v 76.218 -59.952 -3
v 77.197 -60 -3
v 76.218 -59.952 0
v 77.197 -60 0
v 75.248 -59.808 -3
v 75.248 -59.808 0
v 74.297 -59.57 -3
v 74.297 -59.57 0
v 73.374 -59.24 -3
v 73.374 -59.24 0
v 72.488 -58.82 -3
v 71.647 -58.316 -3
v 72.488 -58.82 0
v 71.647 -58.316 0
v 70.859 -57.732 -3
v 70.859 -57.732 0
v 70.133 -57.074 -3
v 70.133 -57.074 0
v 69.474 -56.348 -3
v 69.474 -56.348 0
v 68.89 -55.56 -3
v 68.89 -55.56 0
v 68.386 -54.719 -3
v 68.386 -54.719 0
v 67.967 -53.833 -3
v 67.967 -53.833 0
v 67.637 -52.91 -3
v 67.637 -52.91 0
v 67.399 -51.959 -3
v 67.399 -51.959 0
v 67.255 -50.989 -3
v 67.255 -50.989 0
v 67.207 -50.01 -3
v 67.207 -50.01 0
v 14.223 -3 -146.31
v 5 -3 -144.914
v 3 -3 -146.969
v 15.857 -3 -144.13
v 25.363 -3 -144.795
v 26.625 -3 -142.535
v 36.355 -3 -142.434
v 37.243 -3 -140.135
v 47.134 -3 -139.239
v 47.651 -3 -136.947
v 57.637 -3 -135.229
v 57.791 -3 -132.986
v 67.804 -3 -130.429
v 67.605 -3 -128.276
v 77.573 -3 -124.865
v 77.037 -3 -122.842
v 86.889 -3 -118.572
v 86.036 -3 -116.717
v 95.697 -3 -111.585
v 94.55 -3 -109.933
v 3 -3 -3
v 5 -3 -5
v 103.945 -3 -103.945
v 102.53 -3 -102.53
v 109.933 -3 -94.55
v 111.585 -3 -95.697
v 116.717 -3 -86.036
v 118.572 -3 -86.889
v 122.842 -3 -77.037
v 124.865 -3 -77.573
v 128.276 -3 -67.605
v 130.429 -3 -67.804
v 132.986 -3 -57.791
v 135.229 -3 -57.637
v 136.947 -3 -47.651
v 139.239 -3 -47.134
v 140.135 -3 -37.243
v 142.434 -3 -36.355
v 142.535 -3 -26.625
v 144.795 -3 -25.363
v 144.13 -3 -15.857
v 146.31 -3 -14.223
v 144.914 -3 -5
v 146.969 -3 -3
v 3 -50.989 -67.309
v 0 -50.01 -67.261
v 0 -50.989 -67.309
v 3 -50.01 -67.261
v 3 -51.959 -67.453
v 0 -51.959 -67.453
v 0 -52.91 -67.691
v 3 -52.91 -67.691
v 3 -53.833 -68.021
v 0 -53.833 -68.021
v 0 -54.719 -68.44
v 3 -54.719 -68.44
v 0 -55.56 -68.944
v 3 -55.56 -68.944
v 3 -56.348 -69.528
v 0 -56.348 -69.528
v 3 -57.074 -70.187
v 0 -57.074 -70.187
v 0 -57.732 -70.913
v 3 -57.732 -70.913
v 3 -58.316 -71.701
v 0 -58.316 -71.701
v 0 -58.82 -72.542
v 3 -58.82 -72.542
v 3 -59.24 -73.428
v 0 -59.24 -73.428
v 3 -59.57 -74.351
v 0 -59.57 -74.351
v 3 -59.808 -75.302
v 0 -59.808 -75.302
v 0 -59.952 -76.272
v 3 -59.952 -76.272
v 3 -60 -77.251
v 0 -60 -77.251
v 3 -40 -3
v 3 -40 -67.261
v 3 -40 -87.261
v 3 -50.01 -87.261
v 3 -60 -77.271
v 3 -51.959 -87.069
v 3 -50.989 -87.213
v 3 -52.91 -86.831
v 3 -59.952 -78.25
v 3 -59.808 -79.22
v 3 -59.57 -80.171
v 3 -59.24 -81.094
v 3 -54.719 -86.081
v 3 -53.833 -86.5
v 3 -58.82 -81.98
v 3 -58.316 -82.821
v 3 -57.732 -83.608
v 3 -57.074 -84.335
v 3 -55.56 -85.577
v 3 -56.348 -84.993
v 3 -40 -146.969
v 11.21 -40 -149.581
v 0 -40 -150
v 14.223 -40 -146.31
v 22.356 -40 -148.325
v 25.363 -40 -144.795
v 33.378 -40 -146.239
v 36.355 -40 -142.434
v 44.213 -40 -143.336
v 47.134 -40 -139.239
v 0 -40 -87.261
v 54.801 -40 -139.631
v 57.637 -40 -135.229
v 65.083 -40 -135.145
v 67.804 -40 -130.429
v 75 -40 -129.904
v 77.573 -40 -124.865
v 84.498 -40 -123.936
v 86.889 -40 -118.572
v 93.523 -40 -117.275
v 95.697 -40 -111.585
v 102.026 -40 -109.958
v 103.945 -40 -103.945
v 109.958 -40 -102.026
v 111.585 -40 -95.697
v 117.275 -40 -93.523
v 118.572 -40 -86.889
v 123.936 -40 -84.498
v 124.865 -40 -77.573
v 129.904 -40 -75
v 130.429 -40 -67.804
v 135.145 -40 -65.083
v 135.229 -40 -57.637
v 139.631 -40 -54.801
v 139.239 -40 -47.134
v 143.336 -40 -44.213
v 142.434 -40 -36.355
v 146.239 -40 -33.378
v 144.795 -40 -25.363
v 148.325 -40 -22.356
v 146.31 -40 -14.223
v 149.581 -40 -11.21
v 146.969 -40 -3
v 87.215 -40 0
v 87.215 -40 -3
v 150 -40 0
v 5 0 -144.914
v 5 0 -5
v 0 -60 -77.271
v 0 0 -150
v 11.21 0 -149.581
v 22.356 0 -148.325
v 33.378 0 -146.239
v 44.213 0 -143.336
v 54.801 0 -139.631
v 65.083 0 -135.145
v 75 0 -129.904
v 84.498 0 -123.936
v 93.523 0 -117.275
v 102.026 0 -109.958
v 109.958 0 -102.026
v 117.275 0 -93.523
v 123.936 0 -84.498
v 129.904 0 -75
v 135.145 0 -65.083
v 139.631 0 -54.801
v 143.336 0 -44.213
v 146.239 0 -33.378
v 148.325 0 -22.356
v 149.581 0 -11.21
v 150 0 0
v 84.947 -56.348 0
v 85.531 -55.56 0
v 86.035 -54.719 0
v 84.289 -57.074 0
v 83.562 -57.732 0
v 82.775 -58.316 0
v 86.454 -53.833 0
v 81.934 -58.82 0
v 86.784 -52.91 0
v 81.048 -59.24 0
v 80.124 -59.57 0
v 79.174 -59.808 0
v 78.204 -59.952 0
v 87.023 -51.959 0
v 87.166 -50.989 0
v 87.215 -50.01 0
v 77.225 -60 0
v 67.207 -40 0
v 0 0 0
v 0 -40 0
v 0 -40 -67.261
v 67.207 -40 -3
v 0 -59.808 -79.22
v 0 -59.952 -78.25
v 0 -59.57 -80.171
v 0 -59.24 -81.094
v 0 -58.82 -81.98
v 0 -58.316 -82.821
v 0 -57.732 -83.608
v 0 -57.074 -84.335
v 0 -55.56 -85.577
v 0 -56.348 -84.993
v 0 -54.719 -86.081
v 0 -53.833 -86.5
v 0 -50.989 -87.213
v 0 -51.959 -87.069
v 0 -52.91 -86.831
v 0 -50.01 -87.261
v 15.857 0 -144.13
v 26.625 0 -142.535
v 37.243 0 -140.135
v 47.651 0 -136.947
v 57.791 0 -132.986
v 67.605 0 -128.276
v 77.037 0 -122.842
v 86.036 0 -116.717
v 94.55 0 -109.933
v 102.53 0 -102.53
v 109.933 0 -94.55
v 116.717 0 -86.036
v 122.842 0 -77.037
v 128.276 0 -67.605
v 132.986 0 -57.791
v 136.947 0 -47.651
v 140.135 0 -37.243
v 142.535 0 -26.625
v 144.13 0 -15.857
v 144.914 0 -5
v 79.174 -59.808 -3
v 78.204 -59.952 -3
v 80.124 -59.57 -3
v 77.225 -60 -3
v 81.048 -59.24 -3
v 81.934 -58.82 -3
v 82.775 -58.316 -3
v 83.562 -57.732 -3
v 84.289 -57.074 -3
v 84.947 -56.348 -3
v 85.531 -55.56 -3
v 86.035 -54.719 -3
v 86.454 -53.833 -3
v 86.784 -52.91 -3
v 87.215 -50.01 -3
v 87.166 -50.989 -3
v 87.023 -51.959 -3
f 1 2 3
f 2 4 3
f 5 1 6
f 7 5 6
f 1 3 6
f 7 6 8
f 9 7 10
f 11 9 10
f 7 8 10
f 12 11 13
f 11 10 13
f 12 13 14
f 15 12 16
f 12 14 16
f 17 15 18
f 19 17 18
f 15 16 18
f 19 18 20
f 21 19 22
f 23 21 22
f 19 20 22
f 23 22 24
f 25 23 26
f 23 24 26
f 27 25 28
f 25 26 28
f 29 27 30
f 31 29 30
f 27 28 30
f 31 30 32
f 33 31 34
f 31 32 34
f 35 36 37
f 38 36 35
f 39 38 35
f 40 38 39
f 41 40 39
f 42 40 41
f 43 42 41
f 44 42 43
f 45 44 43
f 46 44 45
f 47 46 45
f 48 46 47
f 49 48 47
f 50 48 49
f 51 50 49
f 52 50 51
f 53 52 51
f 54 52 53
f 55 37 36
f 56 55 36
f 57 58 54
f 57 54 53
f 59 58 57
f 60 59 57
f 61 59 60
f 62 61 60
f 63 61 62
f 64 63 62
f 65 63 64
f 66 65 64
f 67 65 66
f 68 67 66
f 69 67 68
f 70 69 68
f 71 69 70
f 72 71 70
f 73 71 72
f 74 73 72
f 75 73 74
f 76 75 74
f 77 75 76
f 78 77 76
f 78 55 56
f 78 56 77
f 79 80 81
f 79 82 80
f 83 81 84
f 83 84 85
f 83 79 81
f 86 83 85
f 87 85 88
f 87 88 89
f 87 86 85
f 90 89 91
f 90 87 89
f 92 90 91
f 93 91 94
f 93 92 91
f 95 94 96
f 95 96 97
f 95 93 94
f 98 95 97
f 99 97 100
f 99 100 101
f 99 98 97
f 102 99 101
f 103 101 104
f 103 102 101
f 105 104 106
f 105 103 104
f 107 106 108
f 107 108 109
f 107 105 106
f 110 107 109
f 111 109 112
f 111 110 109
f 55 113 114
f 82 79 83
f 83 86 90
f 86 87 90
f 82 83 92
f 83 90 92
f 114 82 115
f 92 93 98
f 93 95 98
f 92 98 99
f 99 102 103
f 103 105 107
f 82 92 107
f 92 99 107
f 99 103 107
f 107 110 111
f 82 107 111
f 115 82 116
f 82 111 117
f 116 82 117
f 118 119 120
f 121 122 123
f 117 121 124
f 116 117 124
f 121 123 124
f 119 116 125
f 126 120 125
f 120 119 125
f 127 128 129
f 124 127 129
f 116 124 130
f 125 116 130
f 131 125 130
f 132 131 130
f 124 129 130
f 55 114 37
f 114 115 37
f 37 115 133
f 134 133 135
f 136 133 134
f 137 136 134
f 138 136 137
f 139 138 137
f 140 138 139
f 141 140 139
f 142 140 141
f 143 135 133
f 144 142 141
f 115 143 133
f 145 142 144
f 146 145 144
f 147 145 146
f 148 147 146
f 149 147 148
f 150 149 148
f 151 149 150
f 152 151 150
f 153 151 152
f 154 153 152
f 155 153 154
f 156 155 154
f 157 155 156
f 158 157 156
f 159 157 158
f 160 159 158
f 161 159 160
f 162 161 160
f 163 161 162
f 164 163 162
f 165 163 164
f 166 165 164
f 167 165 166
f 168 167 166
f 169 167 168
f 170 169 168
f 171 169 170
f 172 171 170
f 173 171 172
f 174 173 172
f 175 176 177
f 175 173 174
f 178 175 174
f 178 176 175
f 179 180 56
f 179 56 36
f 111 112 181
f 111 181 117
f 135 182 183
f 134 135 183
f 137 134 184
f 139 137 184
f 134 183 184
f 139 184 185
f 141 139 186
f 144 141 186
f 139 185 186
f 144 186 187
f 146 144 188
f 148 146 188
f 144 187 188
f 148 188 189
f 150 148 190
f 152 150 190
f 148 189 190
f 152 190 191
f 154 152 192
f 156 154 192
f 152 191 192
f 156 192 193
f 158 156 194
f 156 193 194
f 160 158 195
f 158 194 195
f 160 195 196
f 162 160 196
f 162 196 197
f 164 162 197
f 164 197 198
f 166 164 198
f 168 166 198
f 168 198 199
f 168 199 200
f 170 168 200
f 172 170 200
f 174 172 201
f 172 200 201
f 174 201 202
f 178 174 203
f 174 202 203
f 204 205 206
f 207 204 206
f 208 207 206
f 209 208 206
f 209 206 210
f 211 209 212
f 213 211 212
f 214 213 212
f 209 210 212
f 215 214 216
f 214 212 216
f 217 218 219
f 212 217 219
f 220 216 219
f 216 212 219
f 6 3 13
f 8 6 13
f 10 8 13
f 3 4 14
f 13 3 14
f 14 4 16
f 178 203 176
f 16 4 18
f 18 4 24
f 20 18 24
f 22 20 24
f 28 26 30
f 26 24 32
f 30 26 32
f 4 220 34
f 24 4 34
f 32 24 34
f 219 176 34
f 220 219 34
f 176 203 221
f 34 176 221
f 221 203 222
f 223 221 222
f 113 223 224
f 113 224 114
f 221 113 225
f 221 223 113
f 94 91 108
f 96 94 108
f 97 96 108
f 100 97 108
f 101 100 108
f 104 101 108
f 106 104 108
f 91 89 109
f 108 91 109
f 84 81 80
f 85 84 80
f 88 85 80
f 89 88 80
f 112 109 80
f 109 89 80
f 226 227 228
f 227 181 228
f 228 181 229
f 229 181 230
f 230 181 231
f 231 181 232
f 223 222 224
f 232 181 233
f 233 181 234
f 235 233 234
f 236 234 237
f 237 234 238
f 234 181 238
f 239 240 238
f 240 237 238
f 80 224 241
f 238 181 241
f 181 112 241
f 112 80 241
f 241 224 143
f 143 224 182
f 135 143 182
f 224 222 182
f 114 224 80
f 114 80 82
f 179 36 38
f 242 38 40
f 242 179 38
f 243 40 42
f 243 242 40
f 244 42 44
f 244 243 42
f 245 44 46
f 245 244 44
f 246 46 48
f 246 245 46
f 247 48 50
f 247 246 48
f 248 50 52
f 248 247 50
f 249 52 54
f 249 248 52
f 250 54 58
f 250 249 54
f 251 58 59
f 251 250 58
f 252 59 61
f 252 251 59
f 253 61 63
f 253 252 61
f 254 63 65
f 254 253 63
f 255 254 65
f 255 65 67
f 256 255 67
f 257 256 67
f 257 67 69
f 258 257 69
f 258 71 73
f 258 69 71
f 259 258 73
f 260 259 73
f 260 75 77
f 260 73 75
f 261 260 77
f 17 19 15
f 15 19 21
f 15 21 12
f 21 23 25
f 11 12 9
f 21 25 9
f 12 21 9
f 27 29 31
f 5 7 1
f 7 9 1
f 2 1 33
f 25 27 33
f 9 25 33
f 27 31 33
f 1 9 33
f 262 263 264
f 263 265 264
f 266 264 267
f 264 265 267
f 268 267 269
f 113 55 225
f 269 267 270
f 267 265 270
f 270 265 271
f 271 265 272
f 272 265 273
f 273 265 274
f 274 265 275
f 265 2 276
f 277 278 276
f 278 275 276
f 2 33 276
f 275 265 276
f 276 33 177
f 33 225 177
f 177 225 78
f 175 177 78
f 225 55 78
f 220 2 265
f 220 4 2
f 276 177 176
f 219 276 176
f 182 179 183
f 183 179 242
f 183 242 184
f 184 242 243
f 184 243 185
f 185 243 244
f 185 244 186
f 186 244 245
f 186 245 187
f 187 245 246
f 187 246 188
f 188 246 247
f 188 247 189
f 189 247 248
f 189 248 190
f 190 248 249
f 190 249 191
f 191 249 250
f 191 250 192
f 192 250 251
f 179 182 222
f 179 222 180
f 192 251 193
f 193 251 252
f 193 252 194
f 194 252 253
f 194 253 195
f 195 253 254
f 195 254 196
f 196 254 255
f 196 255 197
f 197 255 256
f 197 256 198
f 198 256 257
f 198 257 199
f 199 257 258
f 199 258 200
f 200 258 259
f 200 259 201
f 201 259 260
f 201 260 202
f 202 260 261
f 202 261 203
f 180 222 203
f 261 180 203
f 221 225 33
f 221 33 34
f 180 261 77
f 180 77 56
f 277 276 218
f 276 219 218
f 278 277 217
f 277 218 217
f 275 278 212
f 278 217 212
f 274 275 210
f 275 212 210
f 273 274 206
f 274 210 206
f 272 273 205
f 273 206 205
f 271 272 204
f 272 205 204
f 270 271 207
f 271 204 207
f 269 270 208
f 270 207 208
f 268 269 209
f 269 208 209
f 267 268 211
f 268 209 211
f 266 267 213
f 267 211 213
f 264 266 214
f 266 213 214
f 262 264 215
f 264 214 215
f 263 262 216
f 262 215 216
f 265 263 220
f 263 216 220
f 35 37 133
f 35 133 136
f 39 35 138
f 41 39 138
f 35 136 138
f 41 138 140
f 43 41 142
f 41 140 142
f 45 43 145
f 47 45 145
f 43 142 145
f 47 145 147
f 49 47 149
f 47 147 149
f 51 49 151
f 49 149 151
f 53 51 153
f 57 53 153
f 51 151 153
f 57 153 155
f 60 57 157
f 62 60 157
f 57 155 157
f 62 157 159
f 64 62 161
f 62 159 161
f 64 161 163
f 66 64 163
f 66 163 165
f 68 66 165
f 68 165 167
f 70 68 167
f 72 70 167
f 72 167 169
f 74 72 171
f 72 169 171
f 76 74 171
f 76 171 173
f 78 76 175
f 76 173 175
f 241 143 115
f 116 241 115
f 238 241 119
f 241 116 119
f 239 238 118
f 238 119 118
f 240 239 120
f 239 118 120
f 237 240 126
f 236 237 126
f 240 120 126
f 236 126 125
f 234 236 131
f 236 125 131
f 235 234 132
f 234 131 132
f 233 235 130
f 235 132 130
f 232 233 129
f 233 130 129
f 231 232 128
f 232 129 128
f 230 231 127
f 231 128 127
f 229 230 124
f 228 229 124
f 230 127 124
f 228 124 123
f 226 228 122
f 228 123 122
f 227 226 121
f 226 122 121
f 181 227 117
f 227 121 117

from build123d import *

# Parameters (mm, degrees)
F1_DEPTH = 40
F2_W     = 3
F2_H     = 20
F2_W_2   = 20.007767
F2_H_2   = 3
F3_DEPTH = 20
F4_R     = 9.99
F5_R     = 9.99
F7_DEPTH = 40
F9_DEPTH = 37


with BuildPart() as f1:
    # F0 (on Front) → F1 (new body)
    with BuildSketch(Plane.XZ):
        with BuildLine():
            Line((0, 0), (0, -150))
            ThreePointArc((0, -150), (106.066017, -106.066017), (150, 0))
            Line((150, 0), (0, 0))
        make_face()
    extrude(amount=F1_DEPTH)

    # F2 (on face) → F3 (join)
    with BuildSketch(Plane.XZ.offset(40)):
        with Locations((1.5, -77.260775)):
            Rectangle(F2_W, F2_H)
        with Locations((77.210668, -1.5)):
            Rectangle(F2_W_2, F2_H_2)
    extrude(amount=F3_DEPTH)

    # F4
    f4_edges = [f1.edges().sort_by_distance(p)[0] for p in [
        (87.214552, -60, -1.5),
    ]]
    fillet(f4_edges, radius=F4_R)

    # F5
    f5_edges = [f1.edges().sort_by_distance(p)[0] for p in [
        (67.206785, -60, -1.5),
        (1.5, -60, -67.260775),
        (1.5, -60, -87.260775),
    ]]
    fillet(f5_edges, radius=F5_R)

    # F6 (on Front) → F7 (cut, through all)
    with BuildSketch(Plane.XZ):
        with BuildLine():
            Line((144.913773, -5), (5, -5))
            Line((5, -5), (5, -144.913773))
            ThreePointArc((5, -144.913773), (102.530487, -102.530487), (144.913773, -5))
        make_face()
    extrude(amount=F7_DEPTH, mode=Mode.SUBTRACT)

    # F8 (on face) → F9 (cut)
    with BuildSketch(Plane.XZ.offset(40)):
        with BuildLine():
            Line((146.969385, -3), (3, -3))
            Line((3, -3), (3, -146.969385))
            ThreePointArc((3, -146.969385), (103.944697, -103.944697), (146.969385, -3))
        make_face()
    extrude(amount=-F9_DEPTH, mode=Mode.SUBTRACT)


solid = f1.part
